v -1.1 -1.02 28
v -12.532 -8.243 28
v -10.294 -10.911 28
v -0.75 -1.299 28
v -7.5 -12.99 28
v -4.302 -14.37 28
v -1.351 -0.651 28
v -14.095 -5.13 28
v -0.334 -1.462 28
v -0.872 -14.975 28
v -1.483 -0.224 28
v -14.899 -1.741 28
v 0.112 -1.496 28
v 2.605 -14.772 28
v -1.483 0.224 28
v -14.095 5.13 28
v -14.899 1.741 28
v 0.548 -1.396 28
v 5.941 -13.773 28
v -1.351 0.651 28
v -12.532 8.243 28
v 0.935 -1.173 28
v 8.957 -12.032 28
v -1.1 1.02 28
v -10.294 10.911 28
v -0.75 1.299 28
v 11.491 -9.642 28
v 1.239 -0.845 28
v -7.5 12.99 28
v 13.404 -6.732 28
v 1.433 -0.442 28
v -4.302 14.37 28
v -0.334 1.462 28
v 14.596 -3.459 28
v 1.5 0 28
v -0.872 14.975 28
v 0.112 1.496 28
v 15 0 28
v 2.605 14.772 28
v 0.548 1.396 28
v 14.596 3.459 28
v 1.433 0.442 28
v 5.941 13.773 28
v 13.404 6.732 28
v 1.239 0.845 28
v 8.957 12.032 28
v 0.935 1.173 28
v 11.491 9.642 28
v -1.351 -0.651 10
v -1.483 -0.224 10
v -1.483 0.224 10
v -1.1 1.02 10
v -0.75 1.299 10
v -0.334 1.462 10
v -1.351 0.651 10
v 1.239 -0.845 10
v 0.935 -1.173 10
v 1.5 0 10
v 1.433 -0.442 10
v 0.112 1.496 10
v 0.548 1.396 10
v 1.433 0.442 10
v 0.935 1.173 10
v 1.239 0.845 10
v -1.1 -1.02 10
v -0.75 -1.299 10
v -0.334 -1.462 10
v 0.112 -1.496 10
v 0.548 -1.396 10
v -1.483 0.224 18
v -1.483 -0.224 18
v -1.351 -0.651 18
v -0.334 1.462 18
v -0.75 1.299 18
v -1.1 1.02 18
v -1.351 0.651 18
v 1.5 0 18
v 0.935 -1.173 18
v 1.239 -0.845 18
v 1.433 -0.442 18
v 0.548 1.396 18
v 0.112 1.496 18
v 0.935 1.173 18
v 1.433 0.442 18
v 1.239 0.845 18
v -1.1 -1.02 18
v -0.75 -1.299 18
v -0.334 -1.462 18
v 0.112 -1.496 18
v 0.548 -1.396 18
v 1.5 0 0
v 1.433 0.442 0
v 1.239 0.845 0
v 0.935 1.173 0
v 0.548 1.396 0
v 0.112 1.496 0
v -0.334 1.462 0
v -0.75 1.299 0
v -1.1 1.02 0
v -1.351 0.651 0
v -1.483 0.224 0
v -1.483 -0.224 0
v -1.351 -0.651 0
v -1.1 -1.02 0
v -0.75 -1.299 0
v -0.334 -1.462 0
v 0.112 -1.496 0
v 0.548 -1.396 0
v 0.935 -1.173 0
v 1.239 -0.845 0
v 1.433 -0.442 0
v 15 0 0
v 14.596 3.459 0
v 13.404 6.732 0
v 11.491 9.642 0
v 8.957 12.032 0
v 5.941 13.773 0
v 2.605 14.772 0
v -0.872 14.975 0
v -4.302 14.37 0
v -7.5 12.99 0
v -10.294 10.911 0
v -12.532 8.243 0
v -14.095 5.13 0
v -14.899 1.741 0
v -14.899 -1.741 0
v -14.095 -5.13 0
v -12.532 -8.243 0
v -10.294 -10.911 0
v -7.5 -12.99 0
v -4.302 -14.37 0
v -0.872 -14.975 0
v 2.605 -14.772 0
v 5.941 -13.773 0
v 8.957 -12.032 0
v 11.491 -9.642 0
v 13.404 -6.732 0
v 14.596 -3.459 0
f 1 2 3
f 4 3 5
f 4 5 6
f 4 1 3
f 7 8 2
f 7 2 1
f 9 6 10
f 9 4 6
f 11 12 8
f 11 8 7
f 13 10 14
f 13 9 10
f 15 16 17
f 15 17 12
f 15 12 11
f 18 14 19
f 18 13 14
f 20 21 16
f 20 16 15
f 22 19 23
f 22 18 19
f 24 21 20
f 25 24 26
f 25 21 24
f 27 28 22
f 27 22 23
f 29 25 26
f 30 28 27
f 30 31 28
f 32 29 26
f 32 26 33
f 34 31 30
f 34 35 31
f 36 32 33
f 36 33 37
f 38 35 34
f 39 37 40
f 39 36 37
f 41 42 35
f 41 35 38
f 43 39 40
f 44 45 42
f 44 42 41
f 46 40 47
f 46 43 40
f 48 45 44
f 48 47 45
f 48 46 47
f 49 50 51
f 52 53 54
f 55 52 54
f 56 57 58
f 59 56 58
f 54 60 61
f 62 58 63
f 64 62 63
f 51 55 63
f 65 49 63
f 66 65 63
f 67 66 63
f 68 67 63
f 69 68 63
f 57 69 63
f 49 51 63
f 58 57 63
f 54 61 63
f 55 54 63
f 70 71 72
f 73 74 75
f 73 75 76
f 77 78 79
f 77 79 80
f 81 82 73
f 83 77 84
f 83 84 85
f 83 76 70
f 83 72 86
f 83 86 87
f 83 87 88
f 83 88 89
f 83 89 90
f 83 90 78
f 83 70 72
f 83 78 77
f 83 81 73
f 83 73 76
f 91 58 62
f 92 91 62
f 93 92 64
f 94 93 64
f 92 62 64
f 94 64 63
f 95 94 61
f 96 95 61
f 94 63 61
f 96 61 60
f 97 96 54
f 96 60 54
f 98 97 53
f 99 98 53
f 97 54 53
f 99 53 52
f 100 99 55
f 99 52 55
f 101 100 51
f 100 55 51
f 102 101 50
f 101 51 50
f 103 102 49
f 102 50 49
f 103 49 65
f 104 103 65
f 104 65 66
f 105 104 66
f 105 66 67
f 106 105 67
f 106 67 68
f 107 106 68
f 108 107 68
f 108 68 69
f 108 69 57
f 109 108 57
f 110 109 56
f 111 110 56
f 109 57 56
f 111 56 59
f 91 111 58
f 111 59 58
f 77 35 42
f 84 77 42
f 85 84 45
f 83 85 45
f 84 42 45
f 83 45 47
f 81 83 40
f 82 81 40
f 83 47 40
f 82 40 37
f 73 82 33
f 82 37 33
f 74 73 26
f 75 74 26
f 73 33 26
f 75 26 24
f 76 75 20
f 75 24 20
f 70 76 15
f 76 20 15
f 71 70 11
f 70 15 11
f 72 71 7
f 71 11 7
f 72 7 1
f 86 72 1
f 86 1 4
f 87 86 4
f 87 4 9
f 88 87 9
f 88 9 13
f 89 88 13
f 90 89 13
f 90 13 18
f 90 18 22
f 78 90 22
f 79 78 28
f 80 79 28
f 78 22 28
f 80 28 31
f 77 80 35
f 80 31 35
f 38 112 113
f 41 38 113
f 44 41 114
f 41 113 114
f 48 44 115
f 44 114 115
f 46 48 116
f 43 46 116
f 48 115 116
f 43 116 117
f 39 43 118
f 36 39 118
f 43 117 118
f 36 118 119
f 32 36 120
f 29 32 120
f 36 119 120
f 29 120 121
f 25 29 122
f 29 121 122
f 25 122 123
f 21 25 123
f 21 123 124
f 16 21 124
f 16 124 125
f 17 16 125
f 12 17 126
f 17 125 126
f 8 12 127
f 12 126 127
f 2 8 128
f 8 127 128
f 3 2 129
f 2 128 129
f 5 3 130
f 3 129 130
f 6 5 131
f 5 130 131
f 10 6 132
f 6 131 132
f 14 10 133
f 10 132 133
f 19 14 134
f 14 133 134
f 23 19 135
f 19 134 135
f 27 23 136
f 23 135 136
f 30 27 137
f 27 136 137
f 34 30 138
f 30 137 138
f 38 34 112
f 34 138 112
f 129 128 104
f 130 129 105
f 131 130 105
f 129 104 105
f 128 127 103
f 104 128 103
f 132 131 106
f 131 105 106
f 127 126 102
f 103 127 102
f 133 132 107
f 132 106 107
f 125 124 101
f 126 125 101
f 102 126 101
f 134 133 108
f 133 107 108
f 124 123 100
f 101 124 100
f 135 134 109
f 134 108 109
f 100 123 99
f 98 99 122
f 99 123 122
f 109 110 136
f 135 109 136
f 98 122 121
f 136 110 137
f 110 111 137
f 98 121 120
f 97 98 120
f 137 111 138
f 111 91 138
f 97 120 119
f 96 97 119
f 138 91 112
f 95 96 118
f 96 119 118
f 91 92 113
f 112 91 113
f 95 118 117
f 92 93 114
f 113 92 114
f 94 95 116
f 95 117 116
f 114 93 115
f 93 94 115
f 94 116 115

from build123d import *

# Parameters (mm, degrees)
SKETCH_1_R          = 15
EXTRUDE_2_DEPTH     = 28
SKETCH_3_R          = 1.5
CUT_EXTRUDE_3_DEPTH = 10
CUT_EXTRUDE_START   = -18
SKETCH_3_2_R        = 1.5
CUT_EXTRUDE_4_DEPTH = 10


with BuildPart() as part:
    # 草图1 → 凸台-拉伸2 (new body)
    with BuildSketch(Plane.XY):
        Circle(SKETCH_1_R)
    extrude(amount=EXTRUDE_2_DEPTH)

    # 草图3 → 切除-拉伸3 (cut)
    with BuildSketch(Plane.XY.offset(28)):
        Circle(SKETCH_3_R)
    extrude(amount=-CUT_EXTRUDE_3_DEPTH, mode=Mode.SUBTRACT)

    # 草图3<2> → 切除-拉伸4 (cut)
    with BuildSketch(Plane.XY.offset(28).offset(CUT_EXTRUDE_START)):
        Circle(SKETCH_3_2_R)
    extrude(amount=-CUT_EXTRUDE_4_DEPTH, mode=Mode.SUBTRACT)


solid = part.part
